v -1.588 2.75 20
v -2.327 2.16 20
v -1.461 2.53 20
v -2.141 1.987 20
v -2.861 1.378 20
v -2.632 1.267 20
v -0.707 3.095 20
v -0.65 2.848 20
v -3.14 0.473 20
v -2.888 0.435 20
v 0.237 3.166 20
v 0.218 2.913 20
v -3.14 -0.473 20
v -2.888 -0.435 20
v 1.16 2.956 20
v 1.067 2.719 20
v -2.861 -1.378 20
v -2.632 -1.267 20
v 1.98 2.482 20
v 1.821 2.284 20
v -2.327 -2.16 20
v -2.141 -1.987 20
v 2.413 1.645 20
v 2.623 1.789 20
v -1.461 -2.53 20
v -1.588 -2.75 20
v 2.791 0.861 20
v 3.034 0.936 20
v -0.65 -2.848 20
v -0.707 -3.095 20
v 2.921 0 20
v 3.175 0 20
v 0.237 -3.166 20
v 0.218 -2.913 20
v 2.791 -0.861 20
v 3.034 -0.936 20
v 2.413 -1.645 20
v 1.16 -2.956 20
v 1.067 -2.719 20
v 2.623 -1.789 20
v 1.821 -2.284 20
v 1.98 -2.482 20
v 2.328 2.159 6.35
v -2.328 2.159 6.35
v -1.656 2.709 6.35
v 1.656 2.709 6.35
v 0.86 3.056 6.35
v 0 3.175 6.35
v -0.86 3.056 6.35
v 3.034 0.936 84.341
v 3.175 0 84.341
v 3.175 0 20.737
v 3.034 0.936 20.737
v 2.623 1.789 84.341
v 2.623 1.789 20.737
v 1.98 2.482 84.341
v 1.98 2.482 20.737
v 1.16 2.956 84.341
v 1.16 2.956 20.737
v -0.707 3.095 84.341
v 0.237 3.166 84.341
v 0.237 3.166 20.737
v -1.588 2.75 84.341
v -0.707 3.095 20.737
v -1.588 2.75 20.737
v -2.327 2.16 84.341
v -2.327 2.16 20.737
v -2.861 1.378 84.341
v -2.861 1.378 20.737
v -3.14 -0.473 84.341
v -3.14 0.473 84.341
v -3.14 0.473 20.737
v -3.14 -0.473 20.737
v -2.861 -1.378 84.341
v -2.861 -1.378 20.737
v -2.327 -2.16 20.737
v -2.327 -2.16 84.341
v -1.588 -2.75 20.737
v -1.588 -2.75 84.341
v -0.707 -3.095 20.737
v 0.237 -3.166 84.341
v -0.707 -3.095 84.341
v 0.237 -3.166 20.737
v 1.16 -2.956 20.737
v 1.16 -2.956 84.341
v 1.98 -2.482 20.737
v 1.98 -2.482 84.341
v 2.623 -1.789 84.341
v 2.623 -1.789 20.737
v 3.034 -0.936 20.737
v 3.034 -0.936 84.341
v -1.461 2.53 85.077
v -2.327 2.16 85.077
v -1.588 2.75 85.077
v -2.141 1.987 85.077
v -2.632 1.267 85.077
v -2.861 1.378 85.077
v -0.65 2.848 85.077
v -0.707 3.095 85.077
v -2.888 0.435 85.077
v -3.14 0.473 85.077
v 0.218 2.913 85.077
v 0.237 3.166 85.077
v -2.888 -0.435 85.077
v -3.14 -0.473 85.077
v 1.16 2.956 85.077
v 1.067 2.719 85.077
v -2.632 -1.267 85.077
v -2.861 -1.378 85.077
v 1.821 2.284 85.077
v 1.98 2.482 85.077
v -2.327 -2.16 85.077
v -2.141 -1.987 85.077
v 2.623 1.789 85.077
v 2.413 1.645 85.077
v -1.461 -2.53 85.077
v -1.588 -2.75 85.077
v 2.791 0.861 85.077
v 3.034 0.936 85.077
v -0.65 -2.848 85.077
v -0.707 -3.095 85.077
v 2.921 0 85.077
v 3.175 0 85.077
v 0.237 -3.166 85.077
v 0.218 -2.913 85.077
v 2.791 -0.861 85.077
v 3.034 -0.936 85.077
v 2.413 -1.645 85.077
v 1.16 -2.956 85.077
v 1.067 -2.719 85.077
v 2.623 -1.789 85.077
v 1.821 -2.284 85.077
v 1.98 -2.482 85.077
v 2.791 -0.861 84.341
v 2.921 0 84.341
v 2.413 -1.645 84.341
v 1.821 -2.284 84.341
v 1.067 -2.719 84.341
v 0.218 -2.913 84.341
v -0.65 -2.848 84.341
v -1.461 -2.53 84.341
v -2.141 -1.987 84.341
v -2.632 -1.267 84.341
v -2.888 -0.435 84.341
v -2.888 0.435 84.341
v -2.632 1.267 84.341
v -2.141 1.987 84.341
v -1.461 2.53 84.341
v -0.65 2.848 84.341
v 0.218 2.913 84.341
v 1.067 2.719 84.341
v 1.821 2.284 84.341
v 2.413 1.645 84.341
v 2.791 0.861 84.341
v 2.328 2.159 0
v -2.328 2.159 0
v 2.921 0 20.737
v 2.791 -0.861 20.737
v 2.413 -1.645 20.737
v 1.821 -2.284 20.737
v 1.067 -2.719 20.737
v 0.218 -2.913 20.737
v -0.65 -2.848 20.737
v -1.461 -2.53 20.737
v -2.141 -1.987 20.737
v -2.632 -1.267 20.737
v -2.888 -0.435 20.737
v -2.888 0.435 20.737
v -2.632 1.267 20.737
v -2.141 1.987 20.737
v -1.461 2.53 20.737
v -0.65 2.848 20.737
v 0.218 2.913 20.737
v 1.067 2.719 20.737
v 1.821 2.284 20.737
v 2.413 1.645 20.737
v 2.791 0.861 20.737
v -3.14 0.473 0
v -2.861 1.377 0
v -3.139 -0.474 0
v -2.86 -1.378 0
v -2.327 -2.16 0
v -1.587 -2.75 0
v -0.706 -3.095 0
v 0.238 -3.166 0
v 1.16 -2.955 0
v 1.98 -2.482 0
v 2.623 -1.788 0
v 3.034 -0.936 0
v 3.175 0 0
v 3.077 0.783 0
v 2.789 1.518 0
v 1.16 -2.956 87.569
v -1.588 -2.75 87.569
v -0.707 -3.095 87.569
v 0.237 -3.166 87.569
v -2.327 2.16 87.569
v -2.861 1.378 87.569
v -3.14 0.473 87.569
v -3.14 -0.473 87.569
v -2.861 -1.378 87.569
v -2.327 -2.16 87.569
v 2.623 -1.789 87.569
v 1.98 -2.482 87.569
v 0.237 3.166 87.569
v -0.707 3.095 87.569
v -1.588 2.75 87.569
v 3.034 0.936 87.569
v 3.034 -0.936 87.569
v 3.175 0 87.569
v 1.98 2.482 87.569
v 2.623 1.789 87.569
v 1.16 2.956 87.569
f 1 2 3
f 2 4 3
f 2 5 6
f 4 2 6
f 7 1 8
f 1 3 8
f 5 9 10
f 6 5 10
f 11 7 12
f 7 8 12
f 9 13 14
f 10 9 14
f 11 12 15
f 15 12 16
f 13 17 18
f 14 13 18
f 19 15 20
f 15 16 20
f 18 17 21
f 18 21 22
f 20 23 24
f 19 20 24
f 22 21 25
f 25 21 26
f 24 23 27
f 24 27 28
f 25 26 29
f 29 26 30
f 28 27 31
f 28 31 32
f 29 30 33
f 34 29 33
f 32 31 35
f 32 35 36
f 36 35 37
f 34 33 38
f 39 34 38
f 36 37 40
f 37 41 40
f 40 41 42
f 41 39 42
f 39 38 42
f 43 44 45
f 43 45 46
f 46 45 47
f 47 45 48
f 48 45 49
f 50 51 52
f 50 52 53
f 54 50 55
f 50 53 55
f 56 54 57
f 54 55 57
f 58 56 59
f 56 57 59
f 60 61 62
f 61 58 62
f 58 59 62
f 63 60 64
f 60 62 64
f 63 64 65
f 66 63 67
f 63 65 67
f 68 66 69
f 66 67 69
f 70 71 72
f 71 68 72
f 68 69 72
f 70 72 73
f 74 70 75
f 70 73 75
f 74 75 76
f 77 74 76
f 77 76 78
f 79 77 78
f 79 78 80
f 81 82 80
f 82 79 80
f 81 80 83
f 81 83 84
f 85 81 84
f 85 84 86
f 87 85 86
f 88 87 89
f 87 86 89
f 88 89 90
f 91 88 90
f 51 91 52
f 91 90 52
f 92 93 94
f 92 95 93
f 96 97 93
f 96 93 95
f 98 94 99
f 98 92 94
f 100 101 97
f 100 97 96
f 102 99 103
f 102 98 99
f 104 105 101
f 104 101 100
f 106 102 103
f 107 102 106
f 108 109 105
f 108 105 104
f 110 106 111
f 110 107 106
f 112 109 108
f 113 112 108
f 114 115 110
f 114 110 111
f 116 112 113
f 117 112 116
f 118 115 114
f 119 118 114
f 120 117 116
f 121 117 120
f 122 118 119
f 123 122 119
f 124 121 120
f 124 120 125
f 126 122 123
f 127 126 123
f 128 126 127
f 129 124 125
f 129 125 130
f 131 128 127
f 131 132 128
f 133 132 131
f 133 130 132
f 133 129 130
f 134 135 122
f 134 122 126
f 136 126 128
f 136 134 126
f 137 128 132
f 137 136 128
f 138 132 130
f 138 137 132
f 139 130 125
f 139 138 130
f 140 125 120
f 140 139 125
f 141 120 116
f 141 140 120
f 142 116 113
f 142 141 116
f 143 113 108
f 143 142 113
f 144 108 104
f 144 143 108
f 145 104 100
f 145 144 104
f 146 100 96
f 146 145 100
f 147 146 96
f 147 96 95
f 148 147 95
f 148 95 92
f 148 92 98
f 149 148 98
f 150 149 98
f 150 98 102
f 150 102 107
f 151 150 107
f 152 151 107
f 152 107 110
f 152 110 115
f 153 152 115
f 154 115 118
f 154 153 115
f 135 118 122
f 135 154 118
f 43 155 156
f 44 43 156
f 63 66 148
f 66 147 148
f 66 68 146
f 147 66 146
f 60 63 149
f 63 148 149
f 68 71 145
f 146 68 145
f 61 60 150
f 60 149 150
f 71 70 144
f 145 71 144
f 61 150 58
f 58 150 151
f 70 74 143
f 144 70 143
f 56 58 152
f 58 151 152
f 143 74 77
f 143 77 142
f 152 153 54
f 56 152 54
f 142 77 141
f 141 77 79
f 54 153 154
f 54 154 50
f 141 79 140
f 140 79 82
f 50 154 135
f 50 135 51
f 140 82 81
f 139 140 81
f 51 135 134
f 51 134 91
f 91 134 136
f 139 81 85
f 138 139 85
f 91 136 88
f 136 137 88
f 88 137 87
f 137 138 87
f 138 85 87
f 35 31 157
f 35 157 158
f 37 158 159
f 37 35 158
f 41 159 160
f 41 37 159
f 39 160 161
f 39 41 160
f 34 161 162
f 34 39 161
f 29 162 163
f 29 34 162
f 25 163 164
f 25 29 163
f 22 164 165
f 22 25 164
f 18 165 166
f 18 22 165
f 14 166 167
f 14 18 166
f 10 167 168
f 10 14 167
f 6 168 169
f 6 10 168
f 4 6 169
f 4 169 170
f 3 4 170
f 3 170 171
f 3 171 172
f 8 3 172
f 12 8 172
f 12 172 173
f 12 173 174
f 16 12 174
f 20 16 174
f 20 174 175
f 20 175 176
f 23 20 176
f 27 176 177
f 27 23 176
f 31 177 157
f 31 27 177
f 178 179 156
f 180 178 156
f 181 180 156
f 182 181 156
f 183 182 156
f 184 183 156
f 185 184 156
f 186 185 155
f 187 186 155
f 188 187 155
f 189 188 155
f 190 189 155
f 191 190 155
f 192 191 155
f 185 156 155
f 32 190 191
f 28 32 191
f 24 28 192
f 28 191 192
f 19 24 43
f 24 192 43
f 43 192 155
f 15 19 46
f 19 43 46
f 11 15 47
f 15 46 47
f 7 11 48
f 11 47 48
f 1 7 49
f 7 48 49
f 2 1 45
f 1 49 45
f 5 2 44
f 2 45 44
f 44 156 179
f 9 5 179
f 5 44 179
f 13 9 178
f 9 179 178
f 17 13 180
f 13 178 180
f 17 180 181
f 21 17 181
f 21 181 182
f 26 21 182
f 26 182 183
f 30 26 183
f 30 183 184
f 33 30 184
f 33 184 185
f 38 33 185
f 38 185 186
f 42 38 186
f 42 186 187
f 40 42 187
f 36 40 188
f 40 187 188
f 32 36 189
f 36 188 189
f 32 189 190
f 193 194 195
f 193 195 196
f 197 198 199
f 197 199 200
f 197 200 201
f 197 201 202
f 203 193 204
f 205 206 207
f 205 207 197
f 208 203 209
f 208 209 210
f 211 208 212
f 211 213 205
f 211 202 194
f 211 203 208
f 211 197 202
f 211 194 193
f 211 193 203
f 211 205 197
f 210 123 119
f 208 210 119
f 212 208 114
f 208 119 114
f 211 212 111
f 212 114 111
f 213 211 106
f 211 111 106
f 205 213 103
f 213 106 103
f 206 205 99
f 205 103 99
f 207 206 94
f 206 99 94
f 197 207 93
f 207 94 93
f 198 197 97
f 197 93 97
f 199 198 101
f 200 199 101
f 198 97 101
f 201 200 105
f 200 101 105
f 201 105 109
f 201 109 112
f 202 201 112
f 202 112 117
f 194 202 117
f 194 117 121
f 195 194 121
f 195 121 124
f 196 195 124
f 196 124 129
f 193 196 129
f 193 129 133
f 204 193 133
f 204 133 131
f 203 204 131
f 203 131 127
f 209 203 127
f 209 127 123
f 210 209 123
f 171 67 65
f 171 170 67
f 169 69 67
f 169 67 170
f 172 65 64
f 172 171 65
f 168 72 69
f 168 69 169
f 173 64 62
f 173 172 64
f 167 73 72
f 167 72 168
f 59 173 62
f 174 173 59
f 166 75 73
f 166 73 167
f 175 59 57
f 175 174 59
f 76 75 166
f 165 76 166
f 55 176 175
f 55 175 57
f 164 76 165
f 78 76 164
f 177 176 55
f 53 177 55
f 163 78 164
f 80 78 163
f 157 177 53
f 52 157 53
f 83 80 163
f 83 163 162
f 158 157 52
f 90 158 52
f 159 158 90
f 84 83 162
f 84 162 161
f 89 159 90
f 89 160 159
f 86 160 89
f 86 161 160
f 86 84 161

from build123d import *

# Parameters (mm, degrees)
F0_R     = 3.175
F1_DEPTH = 87.5692
F3_R     = 3.175
F3_R_2   = 2.921
F4_DEPTH = 0.7366
F6_R     = 3.175
F6_R_2   = 2.921
F7_DEPTH = 0.7366
F9_DEPTH = 6.35


# Not quite as in the source:
# - a length typed as a fraction of an inch, garbled in the dataset ("3 / 203.2 mm" for 3/8 in), is restored


with BuildPart() as f1:
    # F0 (on Top) → F1 (new body)
    with BuildSketch(Plane.XY):
        Circle(F0_R)
    extrude(amount=F1_DEPTH)

    # F3 (on offset) → F4 (cut)
    with BuildSketch(Plane(origin=(0, 0, 20), x_dir=(1, 0, 0), z_dir=(0, 0, -1))):
        Circle(F3_R)
        Circle(F3_R_2, mode=Mode.SUBTRACT)
    extrude(amount=-F4_DEPTH, mode=Mode.SUBTRACT)

    # F6 (on offset) → F7 (cut)
    with BuildSketch(Plane(origin=(0, 0, 84.3406), x_dir=(1, 0, 0), z_dir=(0, 0, -1))):
        Circle(F6_R)
        Circle(F6_R_2, mode=Mode.SUBTRACT)
    extrude(amount=-F7_DEPTH, mode=Mode.SUBTRACT)

    # F8 (on face) → F9 (cut)
    with BuildSketch(Plane(origin=(0, 0, 0), x_dir=(1, 0, 0), z_dir=(0, 0, -1))):
        with BuildLine():
            Line((2.327948453, -2.159), (-2.327948453, -2.159))
            ThreePointArc((-2.327948453, -2.159), (0, -3.175), (2.327948453, -2.159))
        make_face()
    extrude(amount=-F9_DEPTH, mode=Mode.SUBTRACT)


solid = f1.part
